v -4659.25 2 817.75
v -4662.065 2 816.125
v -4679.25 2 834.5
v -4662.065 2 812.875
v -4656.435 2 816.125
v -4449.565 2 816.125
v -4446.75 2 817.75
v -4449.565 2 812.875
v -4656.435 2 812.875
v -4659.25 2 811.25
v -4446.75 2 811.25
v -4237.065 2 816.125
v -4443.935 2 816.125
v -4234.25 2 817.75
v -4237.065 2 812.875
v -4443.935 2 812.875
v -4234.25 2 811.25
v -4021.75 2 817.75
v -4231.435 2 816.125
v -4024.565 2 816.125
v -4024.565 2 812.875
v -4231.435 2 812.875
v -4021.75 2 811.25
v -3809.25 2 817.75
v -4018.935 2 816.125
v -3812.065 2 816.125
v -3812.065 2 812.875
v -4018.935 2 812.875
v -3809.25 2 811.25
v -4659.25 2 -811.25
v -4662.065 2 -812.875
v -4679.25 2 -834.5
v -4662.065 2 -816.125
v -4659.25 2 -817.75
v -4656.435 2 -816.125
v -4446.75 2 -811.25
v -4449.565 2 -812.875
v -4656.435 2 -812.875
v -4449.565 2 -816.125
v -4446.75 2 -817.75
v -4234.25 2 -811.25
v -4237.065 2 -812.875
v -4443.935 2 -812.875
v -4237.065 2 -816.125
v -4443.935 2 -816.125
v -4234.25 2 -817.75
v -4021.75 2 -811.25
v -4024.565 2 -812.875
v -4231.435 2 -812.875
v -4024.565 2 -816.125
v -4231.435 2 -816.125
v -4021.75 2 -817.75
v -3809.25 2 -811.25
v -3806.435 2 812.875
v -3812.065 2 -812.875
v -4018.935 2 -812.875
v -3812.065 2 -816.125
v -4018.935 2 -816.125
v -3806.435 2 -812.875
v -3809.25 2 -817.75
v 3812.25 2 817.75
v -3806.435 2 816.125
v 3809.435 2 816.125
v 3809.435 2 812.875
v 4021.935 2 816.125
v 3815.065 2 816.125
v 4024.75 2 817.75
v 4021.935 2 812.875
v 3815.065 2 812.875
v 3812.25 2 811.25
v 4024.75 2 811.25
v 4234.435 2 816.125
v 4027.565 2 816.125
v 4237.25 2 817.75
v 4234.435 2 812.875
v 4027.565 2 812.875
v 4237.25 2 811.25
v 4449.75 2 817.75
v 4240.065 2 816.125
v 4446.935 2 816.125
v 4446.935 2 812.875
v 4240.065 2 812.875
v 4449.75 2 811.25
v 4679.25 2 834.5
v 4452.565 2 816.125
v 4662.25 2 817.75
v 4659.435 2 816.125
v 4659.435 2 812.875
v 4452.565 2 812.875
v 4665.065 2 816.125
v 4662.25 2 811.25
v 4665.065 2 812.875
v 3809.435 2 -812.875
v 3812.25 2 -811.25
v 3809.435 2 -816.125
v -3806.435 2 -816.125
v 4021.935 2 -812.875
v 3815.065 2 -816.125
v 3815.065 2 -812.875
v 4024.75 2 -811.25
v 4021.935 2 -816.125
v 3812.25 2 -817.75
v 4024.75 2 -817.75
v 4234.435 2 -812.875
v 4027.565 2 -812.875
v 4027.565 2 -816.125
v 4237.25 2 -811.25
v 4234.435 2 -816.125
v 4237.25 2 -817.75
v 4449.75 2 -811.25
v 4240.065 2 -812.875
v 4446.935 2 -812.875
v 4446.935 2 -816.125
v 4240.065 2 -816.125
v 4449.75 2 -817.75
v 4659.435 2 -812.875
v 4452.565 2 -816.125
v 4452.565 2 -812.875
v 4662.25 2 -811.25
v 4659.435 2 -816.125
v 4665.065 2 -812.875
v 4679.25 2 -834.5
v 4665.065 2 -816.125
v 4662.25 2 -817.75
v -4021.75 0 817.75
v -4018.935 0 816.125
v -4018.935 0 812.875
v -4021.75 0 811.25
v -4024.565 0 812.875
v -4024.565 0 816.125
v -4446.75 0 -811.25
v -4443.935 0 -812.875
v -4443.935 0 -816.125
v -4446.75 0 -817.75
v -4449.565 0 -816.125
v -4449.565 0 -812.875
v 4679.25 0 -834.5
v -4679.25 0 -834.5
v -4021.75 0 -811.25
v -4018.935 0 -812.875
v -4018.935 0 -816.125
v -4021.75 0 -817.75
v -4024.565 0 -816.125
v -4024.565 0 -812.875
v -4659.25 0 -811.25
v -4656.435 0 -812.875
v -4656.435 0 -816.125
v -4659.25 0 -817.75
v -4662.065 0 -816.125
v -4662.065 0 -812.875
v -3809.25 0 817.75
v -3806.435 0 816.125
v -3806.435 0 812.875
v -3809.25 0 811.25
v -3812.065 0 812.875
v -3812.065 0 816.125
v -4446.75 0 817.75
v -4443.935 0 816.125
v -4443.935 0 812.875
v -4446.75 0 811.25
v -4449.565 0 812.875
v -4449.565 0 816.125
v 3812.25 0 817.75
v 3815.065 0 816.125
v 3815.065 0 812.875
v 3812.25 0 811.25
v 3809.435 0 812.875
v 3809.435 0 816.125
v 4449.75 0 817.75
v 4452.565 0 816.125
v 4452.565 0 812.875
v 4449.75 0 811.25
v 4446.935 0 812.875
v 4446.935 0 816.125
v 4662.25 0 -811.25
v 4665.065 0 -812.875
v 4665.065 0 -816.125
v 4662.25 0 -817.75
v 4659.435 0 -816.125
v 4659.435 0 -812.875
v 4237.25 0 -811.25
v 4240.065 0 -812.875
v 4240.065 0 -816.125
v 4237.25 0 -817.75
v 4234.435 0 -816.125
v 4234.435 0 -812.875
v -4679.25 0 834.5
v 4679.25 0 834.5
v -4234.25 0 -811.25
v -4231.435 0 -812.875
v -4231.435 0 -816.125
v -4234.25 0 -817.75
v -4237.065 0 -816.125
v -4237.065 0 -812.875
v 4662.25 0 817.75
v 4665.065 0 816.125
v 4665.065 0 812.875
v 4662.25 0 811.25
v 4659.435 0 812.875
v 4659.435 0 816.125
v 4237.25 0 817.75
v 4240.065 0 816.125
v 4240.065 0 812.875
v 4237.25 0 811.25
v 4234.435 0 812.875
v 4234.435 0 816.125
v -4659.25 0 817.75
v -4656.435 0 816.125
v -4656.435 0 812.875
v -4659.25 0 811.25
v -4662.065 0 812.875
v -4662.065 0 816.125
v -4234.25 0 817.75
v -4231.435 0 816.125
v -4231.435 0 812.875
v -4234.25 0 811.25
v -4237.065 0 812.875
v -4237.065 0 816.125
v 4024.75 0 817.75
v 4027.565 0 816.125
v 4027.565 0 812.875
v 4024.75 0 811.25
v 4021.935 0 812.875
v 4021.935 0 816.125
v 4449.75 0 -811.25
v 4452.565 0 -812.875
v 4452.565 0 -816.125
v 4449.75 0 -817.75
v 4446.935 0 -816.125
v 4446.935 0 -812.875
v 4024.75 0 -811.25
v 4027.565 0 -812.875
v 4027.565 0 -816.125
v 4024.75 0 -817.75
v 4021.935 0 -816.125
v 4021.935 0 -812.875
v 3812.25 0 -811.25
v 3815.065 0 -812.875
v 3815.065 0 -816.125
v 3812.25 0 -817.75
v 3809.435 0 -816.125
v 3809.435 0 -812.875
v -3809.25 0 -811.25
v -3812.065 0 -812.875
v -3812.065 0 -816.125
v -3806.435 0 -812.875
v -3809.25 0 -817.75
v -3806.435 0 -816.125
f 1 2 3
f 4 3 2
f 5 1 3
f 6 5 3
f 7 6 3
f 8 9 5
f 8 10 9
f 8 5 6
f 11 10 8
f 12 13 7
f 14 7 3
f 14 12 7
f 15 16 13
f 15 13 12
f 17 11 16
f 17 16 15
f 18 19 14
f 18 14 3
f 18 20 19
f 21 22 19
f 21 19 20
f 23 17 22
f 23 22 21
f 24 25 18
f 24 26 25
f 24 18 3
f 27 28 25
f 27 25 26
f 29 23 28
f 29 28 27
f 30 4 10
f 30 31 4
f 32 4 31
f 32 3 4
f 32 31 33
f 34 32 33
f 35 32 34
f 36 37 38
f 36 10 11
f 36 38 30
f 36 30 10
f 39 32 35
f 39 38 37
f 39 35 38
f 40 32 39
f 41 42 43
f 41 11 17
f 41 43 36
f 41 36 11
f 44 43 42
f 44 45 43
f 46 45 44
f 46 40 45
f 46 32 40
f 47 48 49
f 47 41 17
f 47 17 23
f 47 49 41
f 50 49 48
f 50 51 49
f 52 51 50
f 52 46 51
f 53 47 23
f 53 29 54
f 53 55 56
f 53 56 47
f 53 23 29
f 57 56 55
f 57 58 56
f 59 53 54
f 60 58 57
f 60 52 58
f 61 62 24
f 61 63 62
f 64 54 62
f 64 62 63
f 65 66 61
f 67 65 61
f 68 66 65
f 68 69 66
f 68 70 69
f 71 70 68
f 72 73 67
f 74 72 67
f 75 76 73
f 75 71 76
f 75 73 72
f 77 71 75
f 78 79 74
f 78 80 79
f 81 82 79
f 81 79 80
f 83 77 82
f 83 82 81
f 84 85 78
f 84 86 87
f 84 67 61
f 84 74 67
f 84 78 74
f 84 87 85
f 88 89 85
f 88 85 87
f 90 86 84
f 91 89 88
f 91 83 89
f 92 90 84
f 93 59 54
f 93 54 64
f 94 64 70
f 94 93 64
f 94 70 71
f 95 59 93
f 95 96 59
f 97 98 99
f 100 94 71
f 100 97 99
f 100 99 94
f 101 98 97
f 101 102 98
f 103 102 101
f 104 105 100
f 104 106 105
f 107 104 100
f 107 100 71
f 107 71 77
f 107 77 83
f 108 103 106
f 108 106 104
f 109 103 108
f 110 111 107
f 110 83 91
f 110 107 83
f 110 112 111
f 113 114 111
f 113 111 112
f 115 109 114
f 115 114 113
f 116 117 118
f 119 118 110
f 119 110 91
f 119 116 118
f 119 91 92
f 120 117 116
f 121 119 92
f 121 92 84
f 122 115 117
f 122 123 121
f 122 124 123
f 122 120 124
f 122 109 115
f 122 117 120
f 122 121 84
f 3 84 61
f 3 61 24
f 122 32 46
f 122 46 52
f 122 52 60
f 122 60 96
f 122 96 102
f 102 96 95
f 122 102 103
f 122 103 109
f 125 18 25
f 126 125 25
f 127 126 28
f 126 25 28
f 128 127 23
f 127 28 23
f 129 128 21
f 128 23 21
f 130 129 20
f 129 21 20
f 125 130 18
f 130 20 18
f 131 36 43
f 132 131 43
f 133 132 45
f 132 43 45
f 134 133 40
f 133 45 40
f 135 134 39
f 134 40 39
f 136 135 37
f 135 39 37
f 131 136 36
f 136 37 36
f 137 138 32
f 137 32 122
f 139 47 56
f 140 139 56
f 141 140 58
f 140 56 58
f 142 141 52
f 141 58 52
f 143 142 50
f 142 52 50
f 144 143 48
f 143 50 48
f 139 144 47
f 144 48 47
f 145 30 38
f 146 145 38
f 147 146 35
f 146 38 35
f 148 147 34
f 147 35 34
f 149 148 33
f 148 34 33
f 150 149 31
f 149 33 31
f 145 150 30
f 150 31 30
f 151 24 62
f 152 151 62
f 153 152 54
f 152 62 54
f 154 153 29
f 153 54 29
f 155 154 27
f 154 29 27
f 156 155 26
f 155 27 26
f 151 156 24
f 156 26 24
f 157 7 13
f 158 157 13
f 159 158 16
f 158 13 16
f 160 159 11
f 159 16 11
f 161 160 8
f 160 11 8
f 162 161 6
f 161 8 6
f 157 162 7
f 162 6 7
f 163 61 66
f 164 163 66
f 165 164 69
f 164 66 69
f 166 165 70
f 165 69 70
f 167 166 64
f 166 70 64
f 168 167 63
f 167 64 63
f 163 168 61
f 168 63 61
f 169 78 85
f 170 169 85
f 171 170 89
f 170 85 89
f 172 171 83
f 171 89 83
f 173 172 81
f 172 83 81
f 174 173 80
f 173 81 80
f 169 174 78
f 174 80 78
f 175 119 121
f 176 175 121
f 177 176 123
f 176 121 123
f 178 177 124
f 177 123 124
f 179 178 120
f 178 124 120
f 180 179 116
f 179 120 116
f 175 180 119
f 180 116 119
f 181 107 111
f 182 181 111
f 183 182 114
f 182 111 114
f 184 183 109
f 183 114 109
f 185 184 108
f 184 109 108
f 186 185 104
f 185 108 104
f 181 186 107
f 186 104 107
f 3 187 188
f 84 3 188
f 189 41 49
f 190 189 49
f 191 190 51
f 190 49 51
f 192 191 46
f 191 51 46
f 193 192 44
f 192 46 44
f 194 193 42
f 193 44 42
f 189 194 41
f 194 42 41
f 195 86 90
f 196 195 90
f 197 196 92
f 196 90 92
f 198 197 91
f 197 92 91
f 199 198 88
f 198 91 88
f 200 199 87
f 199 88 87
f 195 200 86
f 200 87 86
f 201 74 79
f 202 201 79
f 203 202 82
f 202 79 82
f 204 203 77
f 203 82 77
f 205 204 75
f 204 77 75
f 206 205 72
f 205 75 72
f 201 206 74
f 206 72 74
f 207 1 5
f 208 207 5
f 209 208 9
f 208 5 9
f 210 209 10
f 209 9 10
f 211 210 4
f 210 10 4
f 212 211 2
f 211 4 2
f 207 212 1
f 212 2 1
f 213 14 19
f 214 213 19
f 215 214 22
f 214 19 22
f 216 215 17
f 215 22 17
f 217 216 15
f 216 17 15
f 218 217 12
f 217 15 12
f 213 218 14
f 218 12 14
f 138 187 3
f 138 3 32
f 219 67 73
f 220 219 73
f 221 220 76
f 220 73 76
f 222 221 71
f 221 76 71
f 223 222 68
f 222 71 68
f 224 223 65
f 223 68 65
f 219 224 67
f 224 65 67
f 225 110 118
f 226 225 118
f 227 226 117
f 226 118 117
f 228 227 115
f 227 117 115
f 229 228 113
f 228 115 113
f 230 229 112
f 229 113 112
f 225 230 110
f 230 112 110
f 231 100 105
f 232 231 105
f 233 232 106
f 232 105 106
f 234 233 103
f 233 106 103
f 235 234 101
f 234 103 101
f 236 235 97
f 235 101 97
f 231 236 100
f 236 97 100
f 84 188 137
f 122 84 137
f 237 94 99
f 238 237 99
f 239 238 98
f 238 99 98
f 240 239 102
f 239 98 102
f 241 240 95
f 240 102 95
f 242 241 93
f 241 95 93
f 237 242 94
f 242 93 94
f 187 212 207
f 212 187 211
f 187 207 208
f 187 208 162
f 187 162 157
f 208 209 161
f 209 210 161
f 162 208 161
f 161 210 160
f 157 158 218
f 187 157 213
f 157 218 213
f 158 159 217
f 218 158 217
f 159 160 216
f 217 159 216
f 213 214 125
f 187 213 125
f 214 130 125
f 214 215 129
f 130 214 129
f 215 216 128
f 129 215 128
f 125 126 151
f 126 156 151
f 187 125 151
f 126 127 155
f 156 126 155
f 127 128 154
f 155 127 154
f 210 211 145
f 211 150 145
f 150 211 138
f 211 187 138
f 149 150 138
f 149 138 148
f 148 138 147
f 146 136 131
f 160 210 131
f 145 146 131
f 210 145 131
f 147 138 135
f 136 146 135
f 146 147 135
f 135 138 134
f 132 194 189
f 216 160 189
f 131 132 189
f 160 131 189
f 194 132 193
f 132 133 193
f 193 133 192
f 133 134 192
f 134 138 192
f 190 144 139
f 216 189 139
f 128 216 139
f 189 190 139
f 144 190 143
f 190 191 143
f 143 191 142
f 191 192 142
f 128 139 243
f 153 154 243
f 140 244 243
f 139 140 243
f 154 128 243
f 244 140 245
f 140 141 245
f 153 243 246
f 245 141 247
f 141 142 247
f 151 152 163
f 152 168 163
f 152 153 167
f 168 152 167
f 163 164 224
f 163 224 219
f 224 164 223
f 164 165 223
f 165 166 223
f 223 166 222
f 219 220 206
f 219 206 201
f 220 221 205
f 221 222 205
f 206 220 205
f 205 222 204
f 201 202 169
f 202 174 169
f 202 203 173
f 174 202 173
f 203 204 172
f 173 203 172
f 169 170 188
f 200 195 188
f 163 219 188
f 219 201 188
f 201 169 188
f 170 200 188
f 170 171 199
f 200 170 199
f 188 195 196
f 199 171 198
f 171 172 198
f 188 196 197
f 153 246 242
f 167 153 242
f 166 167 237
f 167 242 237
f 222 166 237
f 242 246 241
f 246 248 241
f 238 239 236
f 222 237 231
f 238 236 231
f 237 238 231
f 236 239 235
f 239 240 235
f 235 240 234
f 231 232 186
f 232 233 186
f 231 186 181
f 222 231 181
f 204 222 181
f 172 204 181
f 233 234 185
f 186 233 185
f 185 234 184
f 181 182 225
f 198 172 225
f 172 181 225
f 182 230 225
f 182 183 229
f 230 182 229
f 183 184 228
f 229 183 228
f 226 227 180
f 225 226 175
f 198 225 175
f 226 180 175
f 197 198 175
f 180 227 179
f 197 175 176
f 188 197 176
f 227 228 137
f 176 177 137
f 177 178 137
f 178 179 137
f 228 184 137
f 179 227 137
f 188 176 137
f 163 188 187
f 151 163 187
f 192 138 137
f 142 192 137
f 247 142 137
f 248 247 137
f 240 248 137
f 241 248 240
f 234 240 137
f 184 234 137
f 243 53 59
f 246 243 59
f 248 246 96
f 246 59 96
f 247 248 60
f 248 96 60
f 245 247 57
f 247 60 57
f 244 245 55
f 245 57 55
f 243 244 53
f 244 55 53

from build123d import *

# Parameters (mm, degrees)
SKETCH1_W           = 9358.5
SKETCH1_H           = 1669
BOSS_EXTRUDE1_DEPTH = 2
SKETCH3_R           = 3.25
CUT_EXTRUDE1_DEPTH  = 10


with BuildPart() as part:
    # Sketch1 → Boss-Extrude1 (new body)
    with BuildSketch(Plane(origin=(0, 0, 0), x_dir=(1, 0, 0), z_dir=(0, 1, 0))):
        Rectangle(SKETCH1_W, SKETCH1_H)
    extrude(amount=BOSS_EXTRUDE1_DEPTH)

    # Sketch3 → Cut-Extrude1 (cut)
    with BuildSketch(Plane(origin=(0, 2, 0), x_dir=(1, 0, 0), z_dir=(0, 1, 0))):
        with Locations(Location((-4659.25, 814.5, 0), (0, 0, 270))):
            Circle(SKETCH3_R)
        with Locations(Location((-4659.25, -814.5, 0), (0, 0, 270))):
            Circle(SKETCH3_R)
        with Locations(Location((-4446.75, 814.5, 0), (0, 0, 270))):
            Circle(SKETCH3_R)
        with Locations(Location((-4446.75, -814.5, 0), (0, 0, 270))):
            Circle(SKETCH3_R)
        with Locations(Location((-4234.25, 814.5, 0), (0, 0, 270))):
            Circle(SKETCH3_R)
        with Locations(Location((-4234.25, -814.5, 0), (0, 0, 270))):
            Circle(SKETCH3_R)
        with Locations(Location((-4021.75, 814.5, 0), (0, 0, 270))):
            Circle(SKETCH3_R)
        with Locations(Location((-4021.75, -814.5, 0), (0, 0, 270))):
            Circle(SKETCH3_R)
        with Locations(Location((-3809.25, 814.5, 0), (0, 0, 270))):
            Circle(SKETCH3_R)
        with Locations(Location((-3809.25, -814.5, 0), (0, 0, 270))):
            Circle(SKETCH3_R)
        with Locations(Location((4662.25, 814.5, 0), (0, 0, 270))):
            Circle(SKETCH3_R)
        with Locations(Location((4662.25, -814.5, 0), (0, 0, 270))):
            Circle(SKETCH3_R)
        with Locations(Location((4449.75, 814.5, 0), (0, 0, 270))):
            Circle(SKETCH3_R)
        with Locations(Location((4449.75, -814.5, 0), (0, 0, 270))):
            Circle(SKETCH3_R)
        with Locations(Location((4237.25, 814.5, 0), (0, 0, 270))):
            Circle(SKETCH3_R)
        with Locations(Location((4237.25, -814.5, 0), (0, 0, 270))):
            Circle(SKETCH3_R)
        with Locations(Location((4024.75, 814.5, 0), (0, 0, 270))):
            Circle(SKETCH3_R)
        with Locations(Location((4024.75, -814.5, 0), (0, 0, 270))):
            Circle(SKETCH3_R)
        with Locations(Location((3812.25, 814.5, 0), (0, 0, 270))):
            Circle(SKETCH3_R)
        with Locations(Location((3812.25, -814.5, 0), (0, 0, 270))):
            Circle(SKETCH3_R)
    extrude(amount=-CUT_EXTRUDE1_DEPTH, mode=Mode.SUBTRACT)


solid = part.part
